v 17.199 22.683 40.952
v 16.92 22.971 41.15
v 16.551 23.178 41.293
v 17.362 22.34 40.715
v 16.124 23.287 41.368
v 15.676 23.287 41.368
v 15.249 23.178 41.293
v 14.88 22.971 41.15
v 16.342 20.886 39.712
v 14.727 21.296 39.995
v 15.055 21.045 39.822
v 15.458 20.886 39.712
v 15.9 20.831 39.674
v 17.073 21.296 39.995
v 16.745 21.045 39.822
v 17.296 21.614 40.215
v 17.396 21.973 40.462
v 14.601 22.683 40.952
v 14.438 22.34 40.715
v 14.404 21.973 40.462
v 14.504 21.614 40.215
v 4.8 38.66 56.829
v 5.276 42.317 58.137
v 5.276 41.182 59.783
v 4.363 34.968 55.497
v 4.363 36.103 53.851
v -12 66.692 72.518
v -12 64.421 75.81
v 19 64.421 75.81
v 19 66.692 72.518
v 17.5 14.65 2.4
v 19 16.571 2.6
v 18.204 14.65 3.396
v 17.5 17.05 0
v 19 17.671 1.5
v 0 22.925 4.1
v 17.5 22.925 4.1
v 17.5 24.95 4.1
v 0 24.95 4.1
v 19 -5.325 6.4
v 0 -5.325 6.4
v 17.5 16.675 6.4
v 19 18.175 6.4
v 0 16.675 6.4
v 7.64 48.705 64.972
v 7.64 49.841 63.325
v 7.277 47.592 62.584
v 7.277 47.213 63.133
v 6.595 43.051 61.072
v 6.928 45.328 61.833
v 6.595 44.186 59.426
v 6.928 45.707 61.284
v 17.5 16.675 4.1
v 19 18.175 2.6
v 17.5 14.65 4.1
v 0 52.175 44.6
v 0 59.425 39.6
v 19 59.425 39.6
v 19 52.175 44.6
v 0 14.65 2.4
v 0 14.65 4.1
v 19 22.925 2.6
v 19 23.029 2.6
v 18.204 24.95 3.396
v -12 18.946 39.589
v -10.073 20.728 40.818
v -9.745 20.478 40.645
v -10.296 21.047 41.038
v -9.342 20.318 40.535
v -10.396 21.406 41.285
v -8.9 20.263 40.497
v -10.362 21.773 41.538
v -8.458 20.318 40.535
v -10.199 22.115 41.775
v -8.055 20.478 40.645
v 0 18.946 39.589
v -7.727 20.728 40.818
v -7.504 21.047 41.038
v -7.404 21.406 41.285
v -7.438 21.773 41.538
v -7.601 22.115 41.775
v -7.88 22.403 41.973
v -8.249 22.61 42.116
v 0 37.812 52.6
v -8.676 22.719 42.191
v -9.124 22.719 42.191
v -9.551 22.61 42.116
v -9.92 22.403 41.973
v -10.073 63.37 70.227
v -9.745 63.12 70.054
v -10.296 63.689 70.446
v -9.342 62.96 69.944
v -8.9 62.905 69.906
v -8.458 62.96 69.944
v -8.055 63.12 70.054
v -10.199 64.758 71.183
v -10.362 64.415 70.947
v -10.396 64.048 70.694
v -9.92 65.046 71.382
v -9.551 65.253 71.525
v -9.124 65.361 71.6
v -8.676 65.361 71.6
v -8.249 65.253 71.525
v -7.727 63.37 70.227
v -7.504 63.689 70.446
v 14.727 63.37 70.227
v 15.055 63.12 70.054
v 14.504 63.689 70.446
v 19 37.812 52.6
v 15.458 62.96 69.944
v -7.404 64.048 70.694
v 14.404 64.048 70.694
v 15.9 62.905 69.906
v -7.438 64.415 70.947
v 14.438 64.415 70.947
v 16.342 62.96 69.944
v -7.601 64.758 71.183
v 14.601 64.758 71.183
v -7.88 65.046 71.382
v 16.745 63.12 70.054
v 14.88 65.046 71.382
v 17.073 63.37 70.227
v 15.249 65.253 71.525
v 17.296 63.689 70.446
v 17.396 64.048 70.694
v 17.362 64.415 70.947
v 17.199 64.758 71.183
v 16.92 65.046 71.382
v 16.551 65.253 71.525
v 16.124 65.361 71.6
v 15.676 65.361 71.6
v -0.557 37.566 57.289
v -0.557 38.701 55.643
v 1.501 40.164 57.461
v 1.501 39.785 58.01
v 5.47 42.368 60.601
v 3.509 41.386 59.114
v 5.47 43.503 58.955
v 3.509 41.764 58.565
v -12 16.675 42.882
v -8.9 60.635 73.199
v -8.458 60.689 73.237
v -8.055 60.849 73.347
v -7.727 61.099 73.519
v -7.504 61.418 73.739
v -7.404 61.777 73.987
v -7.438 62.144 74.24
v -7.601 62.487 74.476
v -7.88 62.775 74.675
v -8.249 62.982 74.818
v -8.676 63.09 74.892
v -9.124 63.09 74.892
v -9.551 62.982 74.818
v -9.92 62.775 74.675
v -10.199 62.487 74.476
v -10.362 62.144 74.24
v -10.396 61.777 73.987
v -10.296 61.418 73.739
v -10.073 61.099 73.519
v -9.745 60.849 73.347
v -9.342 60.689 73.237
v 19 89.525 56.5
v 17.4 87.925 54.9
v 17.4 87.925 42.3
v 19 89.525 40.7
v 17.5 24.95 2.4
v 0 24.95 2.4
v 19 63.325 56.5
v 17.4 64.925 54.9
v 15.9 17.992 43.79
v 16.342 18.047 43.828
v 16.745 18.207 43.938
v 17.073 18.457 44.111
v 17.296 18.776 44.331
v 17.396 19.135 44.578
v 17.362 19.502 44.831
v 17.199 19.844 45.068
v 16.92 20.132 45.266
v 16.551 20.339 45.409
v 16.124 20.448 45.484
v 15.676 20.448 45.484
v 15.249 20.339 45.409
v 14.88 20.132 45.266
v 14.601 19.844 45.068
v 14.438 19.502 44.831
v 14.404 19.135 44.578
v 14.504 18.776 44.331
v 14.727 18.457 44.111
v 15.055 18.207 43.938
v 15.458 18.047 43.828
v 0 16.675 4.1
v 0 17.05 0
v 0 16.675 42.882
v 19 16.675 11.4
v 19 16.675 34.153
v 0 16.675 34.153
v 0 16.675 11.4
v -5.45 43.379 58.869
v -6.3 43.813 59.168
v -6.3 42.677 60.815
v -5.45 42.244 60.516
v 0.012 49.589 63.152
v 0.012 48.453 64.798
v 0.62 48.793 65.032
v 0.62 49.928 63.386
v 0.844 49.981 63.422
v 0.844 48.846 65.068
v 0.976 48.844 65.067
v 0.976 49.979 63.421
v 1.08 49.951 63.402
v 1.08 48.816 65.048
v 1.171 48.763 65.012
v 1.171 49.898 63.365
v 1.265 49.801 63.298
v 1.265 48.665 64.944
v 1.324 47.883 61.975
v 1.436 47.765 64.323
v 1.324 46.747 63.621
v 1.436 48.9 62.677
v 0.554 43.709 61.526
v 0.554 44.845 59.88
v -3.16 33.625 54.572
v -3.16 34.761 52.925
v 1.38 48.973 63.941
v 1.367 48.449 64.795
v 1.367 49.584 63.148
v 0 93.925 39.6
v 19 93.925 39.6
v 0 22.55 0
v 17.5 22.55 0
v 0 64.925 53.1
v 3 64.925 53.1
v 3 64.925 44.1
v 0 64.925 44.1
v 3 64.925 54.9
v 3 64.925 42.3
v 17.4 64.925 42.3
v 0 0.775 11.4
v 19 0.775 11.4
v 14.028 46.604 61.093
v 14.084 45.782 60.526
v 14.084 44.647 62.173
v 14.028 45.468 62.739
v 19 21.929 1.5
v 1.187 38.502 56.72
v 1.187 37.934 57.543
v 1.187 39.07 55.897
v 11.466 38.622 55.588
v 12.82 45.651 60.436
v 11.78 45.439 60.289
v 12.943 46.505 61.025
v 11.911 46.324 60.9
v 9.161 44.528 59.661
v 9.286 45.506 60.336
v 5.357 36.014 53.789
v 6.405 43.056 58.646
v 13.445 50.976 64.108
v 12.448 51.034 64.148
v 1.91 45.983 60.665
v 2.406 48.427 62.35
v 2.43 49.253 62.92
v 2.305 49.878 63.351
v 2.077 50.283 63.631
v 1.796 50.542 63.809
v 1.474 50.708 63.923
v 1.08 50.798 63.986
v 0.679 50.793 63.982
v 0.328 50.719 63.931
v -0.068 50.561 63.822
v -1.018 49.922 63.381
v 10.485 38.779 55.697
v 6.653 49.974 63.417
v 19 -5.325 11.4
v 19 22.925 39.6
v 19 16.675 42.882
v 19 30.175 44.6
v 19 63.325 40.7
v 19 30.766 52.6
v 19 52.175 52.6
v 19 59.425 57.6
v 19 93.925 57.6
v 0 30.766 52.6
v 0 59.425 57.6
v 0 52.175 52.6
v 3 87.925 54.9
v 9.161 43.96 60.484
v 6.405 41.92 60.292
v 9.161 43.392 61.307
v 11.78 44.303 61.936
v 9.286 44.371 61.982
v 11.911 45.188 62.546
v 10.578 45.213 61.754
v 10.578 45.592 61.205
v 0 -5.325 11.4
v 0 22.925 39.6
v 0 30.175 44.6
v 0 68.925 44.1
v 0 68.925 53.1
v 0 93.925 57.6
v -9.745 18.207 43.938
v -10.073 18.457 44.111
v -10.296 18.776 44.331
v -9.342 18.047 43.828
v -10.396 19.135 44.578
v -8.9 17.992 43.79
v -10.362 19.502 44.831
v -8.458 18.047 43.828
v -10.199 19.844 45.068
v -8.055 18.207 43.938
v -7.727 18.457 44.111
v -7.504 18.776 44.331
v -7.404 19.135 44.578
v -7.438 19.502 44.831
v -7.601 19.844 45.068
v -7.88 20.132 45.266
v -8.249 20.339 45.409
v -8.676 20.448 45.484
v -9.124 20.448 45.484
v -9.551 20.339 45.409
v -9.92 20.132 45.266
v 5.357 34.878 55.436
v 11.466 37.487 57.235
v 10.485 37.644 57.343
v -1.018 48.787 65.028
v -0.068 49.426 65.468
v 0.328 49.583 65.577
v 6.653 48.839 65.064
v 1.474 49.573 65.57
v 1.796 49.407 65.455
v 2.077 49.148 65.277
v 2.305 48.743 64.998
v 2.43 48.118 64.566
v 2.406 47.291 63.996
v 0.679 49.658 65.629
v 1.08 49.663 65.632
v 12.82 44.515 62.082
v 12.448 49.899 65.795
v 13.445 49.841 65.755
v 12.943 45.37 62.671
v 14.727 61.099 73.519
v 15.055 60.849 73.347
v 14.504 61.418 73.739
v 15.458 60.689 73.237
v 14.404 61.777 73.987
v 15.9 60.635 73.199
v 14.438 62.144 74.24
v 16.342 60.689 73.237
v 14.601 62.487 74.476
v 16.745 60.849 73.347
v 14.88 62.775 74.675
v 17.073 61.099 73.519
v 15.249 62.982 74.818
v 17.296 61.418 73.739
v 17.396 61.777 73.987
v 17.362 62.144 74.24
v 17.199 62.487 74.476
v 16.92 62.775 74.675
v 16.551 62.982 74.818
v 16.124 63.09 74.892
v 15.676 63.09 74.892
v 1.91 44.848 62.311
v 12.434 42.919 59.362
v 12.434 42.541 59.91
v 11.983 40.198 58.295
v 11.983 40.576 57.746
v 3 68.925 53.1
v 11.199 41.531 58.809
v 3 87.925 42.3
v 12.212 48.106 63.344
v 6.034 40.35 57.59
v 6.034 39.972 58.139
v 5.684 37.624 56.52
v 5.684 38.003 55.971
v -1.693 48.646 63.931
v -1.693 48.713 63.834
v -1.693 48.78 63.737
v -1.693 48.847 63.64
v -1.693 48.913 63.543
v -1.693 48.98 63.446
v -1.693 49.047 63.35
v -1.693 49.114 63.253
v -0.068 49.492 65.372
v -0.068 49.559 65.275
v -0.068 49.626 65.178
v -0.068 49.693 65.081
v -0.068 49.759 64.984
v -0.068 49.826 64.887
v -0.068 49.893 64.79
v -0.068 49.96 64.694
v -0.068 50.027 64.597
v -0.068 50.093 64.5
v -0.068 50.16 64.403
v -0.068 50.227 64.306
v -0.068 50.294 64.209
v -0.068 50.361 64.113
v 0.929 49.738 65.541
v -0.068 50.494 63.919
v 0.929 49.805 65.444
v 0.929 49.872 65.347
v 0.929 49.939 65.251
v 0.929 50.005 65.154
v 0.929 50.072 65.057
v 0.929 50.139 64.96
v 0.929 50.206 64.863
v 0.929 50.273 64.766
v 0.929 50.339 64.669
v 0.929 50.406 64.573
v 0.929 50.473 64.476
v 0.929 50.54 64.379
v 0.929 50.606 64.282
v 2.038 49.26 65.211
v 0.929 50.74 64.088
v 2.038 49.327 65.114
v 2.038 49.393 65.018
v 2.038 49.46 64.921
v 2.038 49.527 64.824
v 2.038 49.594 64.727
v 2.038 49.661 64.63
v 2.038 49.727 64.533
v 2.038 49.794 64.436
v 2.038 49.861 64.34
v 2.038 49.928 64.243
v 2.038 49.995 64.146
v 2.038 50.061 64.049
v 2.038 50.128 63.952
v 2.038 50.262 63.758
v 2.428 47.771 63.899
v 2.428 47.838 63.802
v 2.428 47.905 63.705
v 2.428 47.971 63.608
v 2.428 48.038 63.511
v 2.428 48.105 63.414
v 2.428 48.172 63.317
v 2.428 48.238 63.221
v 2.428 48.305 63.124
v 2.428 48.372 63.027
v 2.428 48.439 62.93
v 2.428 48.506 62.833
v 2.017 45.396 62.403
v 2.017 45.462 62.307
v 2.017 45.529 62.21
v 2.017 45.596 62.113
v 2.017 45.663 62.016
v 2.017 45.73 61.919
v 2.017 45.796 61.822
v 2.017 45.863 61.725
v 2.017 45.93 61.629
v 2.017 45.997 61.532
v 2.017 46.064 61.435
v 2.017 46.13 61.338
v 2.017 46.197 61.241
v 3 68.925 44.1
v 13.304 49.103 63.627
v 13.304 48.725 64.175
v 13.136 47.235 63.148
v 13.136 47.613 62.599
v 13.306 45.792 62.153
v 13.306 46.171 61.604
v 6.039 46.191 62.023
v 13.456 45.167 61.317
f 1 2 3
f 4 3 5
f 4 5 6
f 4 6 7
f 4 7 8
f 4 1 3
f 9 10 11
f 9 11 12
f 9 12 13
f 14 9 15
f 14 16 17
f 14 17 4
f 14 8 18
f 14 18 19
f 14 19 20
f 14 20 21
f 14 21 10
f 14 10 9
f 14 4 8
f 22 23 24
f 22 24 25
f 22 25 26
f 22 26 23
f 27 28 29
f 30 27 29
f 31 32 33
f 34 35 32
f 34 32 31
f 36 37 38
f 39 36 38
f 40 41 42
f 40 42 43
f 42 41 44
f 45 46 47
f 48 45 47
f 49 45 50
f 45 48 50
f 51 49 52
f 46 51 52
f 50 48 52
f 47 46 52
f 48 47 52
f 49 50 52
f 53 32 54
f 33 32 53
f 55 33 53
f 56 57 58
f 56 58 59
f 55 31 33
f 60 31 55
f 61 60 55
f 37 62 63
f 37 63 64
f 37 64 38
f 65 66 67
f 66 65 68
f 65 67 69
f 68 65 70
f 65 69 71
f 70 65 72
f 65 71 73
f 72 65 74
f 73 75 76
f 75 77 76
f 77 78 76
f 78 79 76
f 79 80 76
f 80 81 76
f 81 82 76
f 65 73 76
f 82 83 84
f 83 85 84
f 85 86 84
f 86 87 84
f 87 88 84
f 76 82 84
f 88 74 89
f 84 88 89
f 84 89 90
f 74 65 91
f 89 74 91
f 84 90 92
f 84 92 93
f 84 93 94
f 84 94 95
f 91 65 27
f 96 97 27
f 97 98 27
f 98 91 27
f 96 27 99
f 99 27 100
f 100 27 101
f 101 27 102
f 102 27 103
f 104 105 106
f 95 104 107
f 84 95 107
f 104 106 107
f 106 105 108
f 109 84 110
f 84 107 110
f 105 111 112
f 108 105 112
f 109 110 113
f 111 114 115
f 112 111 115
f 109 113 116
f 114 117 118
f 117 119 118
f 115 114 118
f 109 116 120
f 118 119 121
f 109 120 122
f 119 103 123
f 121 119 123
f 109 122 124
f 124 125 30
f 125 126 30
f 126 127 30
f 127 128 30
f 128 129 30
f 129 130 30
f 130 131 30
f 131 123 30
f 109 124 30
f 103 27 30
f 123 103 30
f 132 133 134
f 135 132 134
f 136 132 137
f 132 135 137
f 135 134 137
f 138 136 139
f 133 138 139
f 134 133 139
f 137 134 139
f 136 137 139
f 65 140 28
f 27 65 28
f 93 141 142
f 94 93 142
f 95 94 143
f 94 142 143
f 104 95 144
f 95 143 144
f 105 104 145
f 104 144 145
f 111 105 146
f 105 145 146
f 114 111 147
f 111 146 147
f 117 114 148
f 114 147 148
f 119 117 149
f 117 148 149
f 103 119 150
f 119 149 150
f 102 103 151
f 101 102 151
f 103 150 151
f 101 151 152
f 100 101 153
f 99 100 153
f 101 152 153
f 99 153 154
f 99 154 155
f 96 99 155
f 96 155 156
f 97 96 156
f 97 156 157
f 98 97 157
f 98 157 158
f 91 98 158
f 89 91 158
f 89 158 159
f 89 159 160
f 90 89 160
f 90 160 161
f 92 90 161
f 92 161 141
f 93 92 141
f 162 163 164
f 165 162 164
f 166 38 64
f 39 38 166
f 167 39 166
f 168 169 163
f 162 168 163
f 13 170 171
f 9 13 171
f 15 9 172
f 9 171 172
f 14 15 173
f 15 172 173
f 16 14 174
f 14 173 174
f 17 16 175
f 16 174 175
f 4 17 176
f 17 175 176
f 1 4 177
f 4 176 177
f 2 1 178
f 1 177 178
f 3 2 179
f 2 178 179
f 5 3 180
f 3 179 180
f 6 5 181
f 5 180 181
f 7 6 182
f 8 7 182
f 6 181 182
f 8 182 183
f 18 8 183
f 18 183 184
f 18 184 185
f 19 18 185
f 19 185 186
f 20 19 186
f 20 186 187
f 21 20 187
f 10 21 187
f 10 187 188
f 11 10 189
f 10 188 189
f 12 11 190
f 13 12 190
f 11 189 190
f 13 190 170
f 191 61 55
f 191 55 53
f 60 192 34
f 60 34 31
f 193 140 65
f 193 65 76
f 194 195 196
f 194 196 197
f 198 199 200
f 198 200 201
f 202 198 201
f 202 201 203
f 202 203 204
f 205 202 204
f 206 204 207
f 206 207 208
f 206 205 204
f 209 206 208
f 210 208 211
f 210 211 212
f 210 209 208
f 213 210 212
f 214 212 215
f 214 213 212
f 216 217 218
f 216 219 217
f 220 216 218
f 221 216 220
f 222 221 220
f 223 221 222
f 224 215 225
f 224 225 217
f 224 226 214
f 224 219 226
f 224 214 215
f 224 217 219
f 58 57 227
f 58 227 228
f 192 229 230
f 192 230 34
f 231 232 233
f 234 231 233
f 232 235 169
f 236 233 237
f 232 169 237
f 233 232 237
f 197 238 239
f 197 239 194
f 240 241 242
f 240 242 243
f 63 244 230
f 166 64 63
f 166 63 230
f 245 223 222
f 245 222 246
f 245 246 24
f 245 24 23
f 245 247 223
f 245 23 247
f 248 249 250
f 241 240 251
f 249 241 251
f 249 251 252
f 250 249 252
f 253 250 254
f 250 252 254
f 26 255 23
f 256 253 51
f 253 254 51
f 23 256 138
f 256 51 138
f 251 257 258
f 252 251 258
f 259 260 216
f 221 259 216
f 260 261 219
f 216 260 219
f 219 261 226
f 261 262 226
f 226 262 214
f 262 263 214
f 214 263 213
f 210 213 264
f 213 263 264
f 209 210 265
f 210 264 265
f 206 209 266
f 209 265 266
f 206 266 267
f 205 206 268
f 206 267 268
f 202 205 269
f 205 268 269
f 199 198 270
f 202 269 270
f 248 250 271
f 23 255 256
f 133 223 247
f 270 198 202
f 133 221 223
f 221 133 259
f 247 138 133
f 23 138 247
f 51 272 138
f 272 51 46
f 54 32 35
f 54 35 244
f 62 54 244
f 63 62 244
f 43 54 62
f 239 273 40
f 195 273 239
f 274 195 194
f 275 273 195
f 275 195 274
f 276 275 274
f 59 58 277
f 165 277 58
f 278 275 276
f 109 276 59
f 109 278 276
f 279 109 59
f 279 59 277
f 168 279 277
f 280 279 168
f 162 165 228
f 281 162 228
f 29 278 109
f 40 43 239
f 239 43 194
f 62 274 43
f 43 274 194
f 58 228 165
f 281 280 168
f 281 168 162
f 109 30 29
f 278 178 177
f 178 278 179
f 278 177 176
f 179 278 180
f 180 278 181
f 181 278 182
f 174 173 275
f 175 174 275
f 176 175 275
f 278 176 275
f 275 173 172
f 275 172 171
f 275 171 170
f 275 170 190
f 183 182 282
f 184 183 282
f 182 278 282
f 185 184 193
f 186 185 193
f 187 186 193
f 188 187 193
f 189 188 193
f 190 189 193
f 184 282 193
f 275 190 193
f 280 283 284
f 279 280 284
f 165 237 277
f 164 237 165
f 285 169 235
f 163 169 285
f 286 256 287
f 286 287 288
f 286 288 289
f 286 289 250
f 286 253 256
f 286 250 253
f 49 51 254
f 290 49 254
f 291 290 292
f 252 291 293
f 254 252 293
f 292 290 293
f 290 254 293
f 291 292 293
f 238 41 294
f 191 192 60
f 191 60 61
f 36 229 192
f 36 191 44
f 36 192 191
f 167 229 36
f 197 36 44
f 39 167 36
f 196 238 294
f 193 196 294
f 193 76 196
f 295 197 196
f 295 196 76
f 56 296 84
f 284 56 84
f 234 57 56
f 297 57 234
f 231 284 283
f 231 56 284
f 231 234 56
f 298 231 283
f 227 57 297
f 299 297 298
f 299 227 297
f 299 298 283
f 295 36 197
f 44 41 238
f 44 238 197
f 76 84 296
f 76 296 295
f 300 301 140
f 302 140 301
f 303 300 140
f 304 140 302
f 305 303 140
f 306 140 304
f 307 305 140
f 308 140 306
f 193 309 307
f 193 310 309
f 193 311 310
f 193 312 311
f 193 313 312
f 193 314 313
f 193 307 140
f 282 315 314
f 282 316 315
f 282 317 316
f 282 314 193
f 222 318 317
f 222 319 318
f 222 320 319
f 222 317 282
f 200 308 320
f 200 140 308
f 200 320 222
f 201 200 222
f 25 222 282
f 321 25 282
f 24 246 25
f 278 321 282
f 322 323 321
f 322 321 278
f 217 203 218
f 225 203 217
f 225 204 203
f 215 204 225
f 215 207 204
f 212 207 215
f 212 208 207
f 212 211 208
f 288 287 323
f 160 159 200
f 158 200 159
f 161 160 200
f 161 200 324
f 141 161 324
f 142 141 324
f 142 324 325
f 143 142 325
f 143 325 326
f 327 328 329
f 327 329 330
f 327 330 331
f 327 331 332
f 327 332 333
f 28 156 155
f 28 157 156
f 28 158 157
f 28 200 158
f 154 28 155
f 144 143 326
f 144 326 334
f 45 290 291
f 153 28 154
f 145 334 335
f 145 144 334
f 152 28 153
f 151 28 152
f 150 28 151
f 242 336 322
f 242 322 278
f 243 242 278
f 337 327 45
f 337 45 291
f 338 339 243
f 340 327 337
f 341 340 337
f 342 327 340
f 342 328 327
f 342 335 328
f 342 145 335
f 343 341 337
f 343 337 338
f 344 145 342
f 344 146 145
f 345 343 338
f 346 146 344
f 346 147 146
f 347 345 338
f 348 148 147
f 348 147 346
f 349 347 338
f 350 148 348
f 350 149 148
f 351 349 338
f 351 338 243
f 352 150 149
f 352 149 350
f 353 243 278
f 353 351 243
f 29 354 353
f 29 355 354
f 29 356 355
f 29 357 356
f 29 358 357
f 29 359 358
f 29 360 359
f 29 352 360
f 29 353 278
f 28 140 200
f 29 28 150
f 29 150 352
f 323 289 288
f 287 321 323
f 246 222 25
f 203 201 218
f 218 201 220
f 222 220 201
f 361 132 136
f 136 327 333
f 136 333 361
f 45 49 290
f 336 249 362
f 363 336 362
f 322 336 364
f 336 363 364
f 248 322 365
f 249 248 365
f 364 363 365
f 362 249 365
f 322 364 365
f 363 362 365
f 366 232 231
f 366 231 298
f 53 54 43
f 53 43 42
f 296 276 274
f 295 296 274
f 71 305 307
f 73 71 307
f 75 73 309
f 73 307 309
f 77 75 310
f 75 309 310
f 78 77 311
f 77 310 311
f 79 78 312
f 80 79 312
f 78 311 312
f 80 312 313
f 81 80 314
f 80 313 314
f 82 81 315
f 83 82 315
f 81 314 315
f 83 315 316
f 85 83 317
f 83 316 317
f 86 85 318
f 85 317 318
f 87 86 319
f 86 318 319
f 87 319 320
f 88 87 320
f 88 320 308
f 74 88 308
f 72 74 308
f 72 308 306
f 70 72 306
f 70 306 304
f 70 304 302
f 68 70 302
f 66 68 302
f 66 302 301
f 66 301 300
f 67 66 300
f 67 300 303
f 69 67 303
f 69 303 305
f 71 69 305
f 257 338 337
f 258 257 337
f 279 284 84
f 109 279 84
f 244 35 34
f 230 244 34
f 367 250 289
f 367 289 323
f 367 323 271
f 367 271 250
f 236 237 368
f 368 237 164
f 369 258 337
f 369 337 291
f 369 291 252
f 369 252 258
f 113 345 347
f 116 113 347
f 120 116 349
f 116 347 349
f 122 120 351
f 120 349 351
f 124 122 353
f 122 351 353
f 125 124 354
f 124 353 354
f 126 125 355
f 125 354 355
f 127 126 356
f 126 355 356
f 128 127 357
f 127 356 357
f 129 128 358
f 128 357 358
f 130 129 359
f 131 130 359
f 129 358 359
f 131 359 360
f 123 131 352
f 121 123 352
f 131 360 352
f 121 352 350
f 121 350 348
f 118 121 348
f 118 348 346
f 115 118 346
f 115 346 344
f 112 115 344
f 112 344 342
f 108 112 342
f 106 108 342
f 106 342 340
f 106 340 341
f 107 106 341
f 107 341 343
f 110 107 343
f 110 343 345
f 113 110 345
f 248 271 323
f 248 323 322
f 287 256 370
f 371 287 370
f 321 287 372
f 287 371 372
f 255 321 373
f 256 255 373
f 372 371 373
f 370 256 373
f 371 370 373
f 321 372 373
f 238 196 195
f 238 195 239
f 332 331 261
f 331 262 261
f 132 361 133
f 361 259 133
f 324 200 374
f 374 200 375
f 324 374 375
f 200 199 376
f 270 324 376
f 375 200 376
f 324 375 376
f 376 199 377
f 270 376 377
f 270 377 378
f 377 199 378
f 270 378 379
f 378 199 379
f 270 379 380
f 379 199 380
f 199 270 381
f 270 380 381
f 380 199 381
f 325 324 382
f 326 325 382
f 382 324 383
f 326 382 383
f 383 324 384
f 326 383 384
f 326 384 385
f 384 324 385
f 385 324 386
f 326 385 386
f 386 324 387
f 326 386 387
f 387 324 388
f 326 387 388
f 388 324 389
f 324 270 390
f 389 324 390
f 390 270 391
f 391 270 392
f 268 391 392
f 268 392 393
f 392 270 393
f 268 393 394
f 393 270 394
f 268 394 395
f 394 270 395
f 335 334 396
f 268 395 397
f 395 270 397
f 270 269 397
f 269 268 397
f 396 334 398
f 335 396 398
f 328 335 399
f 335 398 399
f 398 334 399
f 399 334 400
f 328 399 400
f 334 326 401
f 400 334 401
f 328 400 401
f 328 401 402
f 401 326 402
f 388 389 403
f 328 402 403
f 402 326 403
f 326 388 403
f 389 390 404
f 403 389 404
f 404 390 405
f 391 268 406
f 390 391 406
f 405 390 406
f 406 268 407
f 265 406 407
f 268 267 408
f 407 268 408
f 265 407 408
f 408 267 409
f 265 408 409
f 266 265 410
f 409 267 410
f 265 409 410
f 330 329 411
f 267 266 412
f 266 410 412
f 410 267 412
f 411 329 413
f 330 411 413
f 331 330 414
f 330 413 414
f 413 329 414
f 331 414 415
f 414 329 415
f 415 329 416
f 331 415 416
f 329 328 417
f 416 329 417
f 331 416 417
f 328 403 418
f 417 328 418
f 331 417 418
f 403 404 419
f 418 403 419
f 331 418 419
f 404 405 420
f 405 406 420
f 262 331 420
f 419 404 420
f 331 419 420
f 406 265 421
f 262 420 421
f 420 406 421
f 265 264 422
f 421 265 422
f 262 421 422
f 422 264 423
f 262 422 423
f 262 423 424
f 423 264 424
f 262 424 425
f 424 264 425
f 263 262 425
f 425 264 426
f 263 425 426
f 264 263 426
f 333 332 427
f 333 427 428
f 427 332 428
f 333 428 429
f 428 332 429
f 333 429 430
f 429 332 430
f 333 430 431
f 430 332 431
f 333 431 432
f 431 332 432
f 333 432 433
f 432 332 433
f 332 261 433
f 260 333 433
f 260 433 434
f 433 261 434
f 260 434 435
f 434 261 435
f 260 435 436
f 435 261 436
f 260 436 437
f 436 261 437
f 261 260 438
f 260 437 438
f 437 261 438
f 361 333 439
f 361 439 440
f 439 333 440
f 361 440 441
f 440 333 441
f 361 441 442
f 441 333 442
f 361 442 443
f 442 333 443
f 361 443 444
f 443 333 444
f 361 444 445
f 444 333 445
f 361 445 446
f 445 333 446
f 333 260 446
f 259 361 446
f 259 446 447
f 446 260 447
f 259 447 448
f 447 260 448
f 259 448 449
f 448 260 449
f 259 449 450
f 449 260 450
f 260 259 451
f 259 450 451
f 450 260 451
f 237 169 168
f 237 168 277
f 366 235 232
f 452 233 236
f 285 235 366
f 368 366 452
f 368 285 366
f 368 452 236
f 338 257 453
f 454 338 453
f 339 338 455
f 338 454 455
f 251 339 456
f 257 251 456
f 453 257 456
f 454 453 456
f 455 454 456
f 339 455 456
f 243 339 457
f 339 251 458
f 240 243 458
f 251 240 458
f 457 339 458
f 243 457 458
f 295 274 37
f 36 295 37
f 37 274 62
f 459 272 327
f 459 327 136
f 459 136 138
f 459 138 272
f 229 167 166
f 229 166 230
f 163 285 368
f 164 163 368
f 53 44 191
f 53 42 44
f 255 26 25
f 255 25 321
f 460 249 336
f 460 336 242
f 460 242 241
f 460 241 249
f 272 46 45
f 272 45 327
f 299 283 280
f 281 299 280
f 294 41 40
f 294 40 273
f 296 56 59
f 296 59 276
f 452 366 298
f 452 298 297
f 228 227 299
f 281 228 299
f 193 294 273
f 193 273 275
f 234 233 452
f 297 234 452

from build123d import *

# Parameters (mm, degrees)
BOSS_EXTRUDE1_DEPTH     = 19
SKETCH3_W               = 5.025645198
SKETCH3_H               = 33.799871634
BOSS_EXTRUDE2_DEPTH     = 19
SKETCH4_W               = 5.025645198
SKETCH4_H               = 7.749871634
CUT_EXTRUDE1_DEPTH      = 41.8379487
SKETCH5_W               = 11.025645198
SKETCH5_H               = 26.05
CUT_EXTRUDE3_DEPTH      = 37.732721166
SKETCH6_W               = 40.5
SKETCH6_H               = 6.25
BOSS_EXTRUDE3_DEPTH     = 19
SKETCH7_W               = 18
SKETCH7_H               = 64
BOSS_EXTRUDE4_DEPTH     = 19
BOSS_EXTRUDE5_DEPTH     = 19
SKETCH10_W              = 12.6
SKETCH10_H              = 23
CUT_EXTRUDE4_DEPTH      = 16
BOSS_EXTRUDE7_DEPTH     = 19
CUT_EXTRUDE6_DEPTH      = 106.993941454
CUT_EXTRUDE7_DEPTH      = 106.993941454
SKETCH20_W              = 9.1
SKETCH20_H              = 10.3
CUT_EXTRUDE10_DEPTH     = 106.993941454
SKETCH21_W              = 5
SKETCH21_H              = 22
BOSS_EXTRUDE8_DEPTH     = 19
SKETCH23_W              = 19
SKETCH23_H              = 18
BOSS_EXTRUDE9_DEPTH     = 2
CHAMFER1_SIZE           = 1.5
SKETCH24_W              = 9
SKETCH24_H              = 4
CUT_EXTRUDE12_DEPTH     = 108.151367817
CUT_EXTRUDE13_DEPTH     = 108.640213791
BOSS_EXTRUDE10_DEPTH    = 19
SKETCH29_W              = 19
SKETCH29_H              = 18
BOSS_EXTRUDE11_DEPTH    = 10
SKETCH30_W              = 12.6
SKETCH30_H              = 23
BOSS_EXTRUDE12_DEPTH    = 19
SKETCH34_W              = 18
SKETCH34_H              = 5
CUT_EXTRUDE16_DEPTH     = 117.038423055
SKETCH36_W              = 31
SKETCH36_H              = 58
BOSS_EXTRUDE13_DEPTH    = 4
SKETCH37_R              = 1.5
CUT_EXTRUDE17_DEPTH     = 5
CUT_EXTRUDE_THIN1_START = -2
CUT_EXTRUDE_THIN1_DEPTH = 2
SKETCH40_W              = 12.6
SKETCH40_H              = 23
CUT_EXTRUDE18_DEPTH     = 16
SKETCH41_W              = 9
SKETCH41_H              = 4
CUT_EXTRUDE19_DEPTH     = 16
CHAMFER2_SIZE           = 1.6


# Read off the part's stored shape, not the designer's step: Cut-Extrude-Thin1
with BuildPart() as part:
    # Sketch2 → Boss-Extrude1 (new body)
    with BuildSketch(Plane(origin=(0, 0, 0), x_dir=(0, 0, -1), z_dir=(1, 0, 0))):
        Polygon((-4.1, 3.125), (-14.1, 3.125), (-14.1, -3.125), (-4.1, -3.125), (-4.1, -5.15), (-2.4, -5.15), (0, -2.75), (0, 2.75), (-2.4, 5.15), (-4.1, 5.15), align=None)
    boss_extrude1 = extrude(amount=BOSS_EXTRUDE1_DEPTH)

    # Sketch3 → Boss-Extrude2 (add)
    with BuildSketch(Plane.ZY):
        with Locations((16.612822599, 13.774935817)):
            Rectangle(SKETCH3_W, SKETCH3_H)
    extrude(amount=-BOSS_EXTRUDE2_DEPTH)

    # Mirror2: Boss-Extrude1 across plane
    add(boss_extrude1.mirror(Plane.ZX.offset(9.9)))

    # Sketch4 → Cut-Extrude1 (cut, through all)
    with BuildSketch(Plane.ZY):
        with Locations((16.612822599, 26.799935817)):
            Rectangle(SKETCH4_W, SKETCH4_H)
    extrude(amount=-CUT_EXTRUDE1_DEPTH, mode=Mode.SUBTRACT)

    # Sketch5 → Cut-Extrude3 (cut, through all)
    with BuildSketch(Plane(origin=(19, 0, 0), x_dir=(0, 0, -1), z_dir=(1, 0, 0))):
        with Locations((-13.612822599, 9.9)):
            Rectangle(SKETCH5_W, SKETCH5_H)
    extrude(amount=-CUT_EXTRUDE3_DEPTH, mode=Mode.SUBTRACT)


with BuildPart() as cut_extrude3_piece_1:
    # of the separate pieces the step leaves, piece 1, a body of its own (cut_extrude3_pieces)
    add(part.part.solids().sort_by_distance((0, 16.675, 8.1))[0])



with BuildPart() as cut_extrude3_piece_2:
    # of the separate pieces the step leaves, piece 2, a body of its own (cut_extrude3_pieces)
    add(part.part.solids().sort_by_distance((0, 3.125, 4.1))[0])


with BuildPart() as cut_extrude3_piece_1_1:
    add(cut_extrude3_piece_1.part)

    add(cut_extrude3_piece_2.part)  # Boss-Extrude3 merges Cut-Extrude3 piece 2
    # Sketch6 → Boss-Extrude3 (add)
    with BuildSketch(Plane(origin=(19, 0, 0), x_dir=(0, 0, -1), z_dir=(1, 0, 0))):
        Polygon((-35.815909091, 16.675), (-48.6, 16.675), (-8.1, -3.125), (-8.1, 3.125), align=None)
        with Locations((-28.35, 19.8)):
            Rectangle(SKETCH6_W, SKETCH6_H)
    extrude(amount=-BOSS_EXTRUDE3_DEPTH)

    # Sketch7 → Boss-Extrude4 (add)
    with BuildSketch(Plane.ZY):
        with Locations((48.6, 54.925)):
            Rectangle(SKETCH7_W, SKETCH7_H)
    extrude(amount=-BOSS_EXTRUDE4_DEPTH)

    # Sketch9 → Boss-Extrude5 (add)
    with BuildSketch(Plane.ZY):
        Polygon((57.6, 22.925), (48.6, 22.925), (48.6, 16.675), align=None)
    extrude(amount=-BOSS_EXTRUDE5_DEPTH)

    # Sketch10 → Cut-Extrude4 (cut)
    with BuildSketch(Plane.ZY):
        with Locations((48.6, 74.425)):
            Rectangle(SKETCH10_W, SKETCH10_H)
    extrude(amount=-CUT_EXTRUDE4_DEPTH, mode=Mode.SUBTRACT)

    # Sketch13 → Boss-Extrude7 (add)
    with BuildSketch(Plane.ZY):
        Polygon((9.1, 16.675), (9.1, 3.613888889), (35.815909091, 16.675), align=None)
    extrude(amount=-BOSS_EXTRUDE7_DEPTH)

    # Sketch14 → Cut-Extrude6 (cut, through all)
    with BuildSketch(Plane.ZY):
        Polygon((39.6, 59.425), (44.6, 52.175), (44.6, 30.175), (39.6, 22.925), align=None)
        Polygon((52.6, 30.175), (57.6, 22.925), (57.6, 59.425), (52.6, 52.175), align=None)
    extrude(amount=-CUT_EXTRUDE6_DEPTH, mode=Mode.SUBTRACT)

    # Sketch16 → Cut-Extrude7 (cut, through all)
    with BuildSketch(Plane(origin=(19, 0, 0), x_dir=(0, 0, -1), z_dir=(1, 0, 0))):
        Polygon((-8.1, -3.125), (-58.554154728, 21.541475645), (-57.6, 22.925), align=None)
    extrude(amount=-CUT_EXTRUDE7_DEPTH, mode=Mode.SUBTRACT)

    # Sketch20 → Cut-Extrude10 (cut, through all)
    with BuildSketch(Plane.ZY):
        Polygon((52.6, 16.675), (9.1, 16.675), (9.1, 5.15), (9.1, -5.15), (52.6, -5.15), align=None)
        with Locations((4.55, 0)):
            Rectangle(SKETCH20_W, SKETCH20_H)
    extrude(amount=-CUT_EXTRUDE10_DEPTH, mode=Mode.SUBTRACT)

    # Sketch21 → Boss-Extrude8 (add, through all)
    with BuildSketch(Plane.ZY):
        with Locations((8.9, 5.675)):
            Rectangle(SKETCH21_W, SKETCH21_H)
    extrude(amount=-BOSS_EXTRUDE8_DEPTH)

    # Sketch23 → Boss-Extrude9 (add)
    with BuildSketch(Plane(origin=(0, 86.925, 0), x_dir=(1, 0, 0), z_dir=(0, 1, 0))):
        with Locations((9.5, -48.6)):
            Rectangle(SKETCH23_W, SKETCH23_H)
    extrude(amount=BOSS_EXTRUDE9_DEPTH)

    # Chamfer1
    # the kernel refuses this chamfer: 1.5 mm, written as the material it takes off along each edge
    with BuildSketch(Plane(origin=(19, 10.792475518, 4.1), x_dir=(0.027495876610586775, 0, -0.9996219169112968), z_dir=(0, 1, 0)), Plane(origin=(19, 22.925, 4.1), x_dir=(0.027495876610586775, 0, -0.9996219169112968), z_dir=(0, 1, 0))) as chamfer1_piece_1:
        Polygon((CHAMFER1_SIZE * 0.999621916911, CHAMFER1_SIZE * 0.0274958766106), (-CHAMFER1_SIZE * 0.0274958766106, CHAMFER1_SIZE * 0.999621916911), (0, 0), align=None)
    extrude(amount=5.882524482, mode=Mode.SUBTRACT)
    with BuildSketch(Plane(origin=(19, 19.77768172, -2.72768172), x_dir=(0.027495876610586747, 0.7068394360706739, 0.7068394360706729), z_dir=(0, -0.707106781186547, 0.707106781186548)), Plane(origin=(19, 27.67768172, 5.12768172), x_dir=(0.027495876610586768, -0.7068394360706726, 0.7068394360706743), z_dir=(0, -0.7071067811865483, -0.7071067811865467))) as chamfer1_piece_2:
        Polygon((CHAMFER1_SIZE * 0.999621916911, CHAMFER1_SIZE * 0.0274958766106), (-CHAMFER1_SIZE * 0.0274958766106, CHAMFER1_SIZE * 0.999621916911), (0, 0), align=None)
    extrude(amount=11.109161514, mode=Mode.SUBTRACT)
    with BuildSketch(Plane(origin=(19, 26.407524482, 0), x_dir=(0.027495876610586778, 1.269416837651831e-15, 0.9996219169112968), z_dir=(0, -1, 0))) as chamfer1_piece_3:
        Polygon((CHAMFER1_SIZE * 0.999621916911, CHAMFER1_SIZE * 0.0274958766106), (-CHAMFER1_SIZE * 0.0274958766106, CHAMFER1_SIZE * 0.999621916911), (0, 0), align=None)
    extrude(amount=13.215048964, mode=Mode.SUBTRACT)
    with BuildSketch(Plane(origin=(19, 16.675, 4.1), x_dir=(0.027495876610586768, 0.9996219169112968, 0), z_dir=(0, 0, 1))) as chamfer1_piece_4:
        Polygon((CHAMFER1_SIZE * 0.999621916911, CHAMFER1_SIZE * 0.0274958766106), (-CHAMFER1_SIZE * 0.0274958766106, CHAMFER1_SIZE * 0.999621916911), (0, 0), align=None)
    extrude(amount=2.3, mode=Mode.SUBTRACT)
    with BuildSketch(Plane(origin=(19, 16.675, 0.242475518), x_dir=(0.027495876610586768, 0.9996219169112968, 0), z_dir=(0, 0, 1))) as chamfer1_piece_5a_section:
        Polygon((CHAMFER1_SIZE * 0.999621916911, CHAMFER1_SIZE * 0.0274958766106), (-CHAMFER1_SIZE * 0.0274958766106, CHAMFER1_SIZE * 0.999621916911), (0, 0), align=None)
    chamfer1_piece_5a = extrude(amount=6.157524482, mode=Mode.PRIVATE)
    chamfer1_piece_5a = split(chamfer1_piece_5a, bisect_by=Plane(origin=(18.50530956, 17.16969044, 4.1), z_dir=(0, 0, -1)), keep=Keep.TOP, mode=Mode.PRIVATE)
    with BuildSketch(Plane(origin=(19, 10.792475518, 4.1), x_dir=(0.027495876610586775, 0, -0.9996219169112968), z_dir=(0, 1, 0))) as chamfer1_piece_5b_section:
        Polygon((CHAMFER1_SIZE * 0.999621916911, CHAMFER1_SIZE * 0.0274958766106), (-CHAMFER1_SIZE * 0.0274958766106, CHAMFER1_SIZE * 0.999621916911), (0, 0), align=None)
    chamfer1_piece_5b = extrude(amount=9.740048964, mode=Mode.PRIVATE)
    chamfer1_piece_5b = split(chamfer1_piece_5b, bisect_by=Plane(origin=(18.50530956, 16.675, 3.60530956), z_dir=(0, 1, 0)), keep=Keep.TOP, mode=Mode.PRIVATE)
    chamfer1_piece_5 = chamfer1_piece_5a & chamfer1_piece_5b
    add(chamfer1_piece_5, mode=Mode.SUBTRACT)

    # Sketch24 → Cut-Extrude12 (cut, through all)
    with BuildSketch(Plane.ZY.offset(-16)):
        with Locations((48.6, 64.925)):
            Rectangle(SKETCH24_W, SKETCH24_H)
    extrude(amount=-CUT_EXTRUDE12_DEPTH, mode=Mode.SUBTRACT)

    # Sketch25 → Cut-Extrude13 (cut, through all)
    with BuildSketch(Plane.ZY):
        Polygon((52.6, 30.766303154), (42.881859894, 16.675), (45.723800384, 16.675), (57.6, 22.925), align=None)
    extrude(amount=-CUT_EXTRUDE13_DEPTH, mode=Mode.SUBTRACT)

    # Sketch28 → Boss-Extrude10 (add, through all)
    with BuildSketch(Plane.ZY):
        Polygon((11.4, -5.325), (42.881859894, 16.675), (34.152967104, 16.675), (11.4, 0.774882346), align=None)
    extrude(amount=-BOSS_EXTRUDE10_DEPTH)

    # Sketch29 → Boss-Extrude11 (add)
    with BuildSketch(Plane(origin=(0, 88.925, 0), x_dir=(1, 0, 0), z_dir=(0, 1, 0))):
        with Locations((9.5, -48.6)):
            Rectangle(SKETCH29_W, SKETCH29_H)
    extrude(amount=BOSS_EXTRUDE11_DEPTH)

    # Sketch30 → Boss-Extrude12 (add, through all)
    with BuildSketch(Plane.ZY):
        with Locations((48.6, 74.425)):
            Rectangle(SKETCH30_W, SKETCH30_H)
    extrude(amount=-BOSS_EXTRUDE12_DEPTH)

    # Sketch34 → Cut-Extrude16 (cut, through all)
    with BuildSketch(Plane.ZY):
        with Locations((48.6, 96.425)):
            Rectangle(SKETCH34_W, SKETCH34_H)
    extrude(amount=-CUT_EXTRUDE16_DEPTH, mode=Mode.SUBTRACT)

    # Sketch36 → Boss-Extrude13 (add)
    with BuildSketch(Plane(origin=(0, -14.666783834, 21.26683656), x_dir=(1, 0, 0), z_dir=(0, -0.5677329558036595, 0.8232127859153066))):
        with Locations((3.5, 67.072518273)):
            Rectangle(SKETCH36_W, SKETCH36_H)
    extrude(amount=-BOSS_EXTRUDE13_DEPTH)

    # Sketch37 → Cut-Extrude17 (cut)
    with BuildSketch(Plane(origin=(0, -14.666783834, 21.26683656), x_dir=(1, 0, 0), z_dir=(0, -0.5677329558036595, 0.8232127859153066))):
        with Locations(Location((-8.9, 92.972518273, 0), (0, 0, 270))):
            Circle(SKETCH37_R)
        with Locations(Location((15.9, 92.972518273, 0), (0, 0, 270))):
            Circle(SKETCH37_R)
        with Locations(Location((15.9, 41.172518273, 0), (0, 0, 270))):
            Circle(SKETCH37_R)
        with Locations(Location((-8.9, 41.172518273, 0), (0, 0, 270))):
            Circle(SKETCH37_R)
    extrude(amount=-CUT_EXTRUDE17_DEPTH, mode=Mode.SUBTRACT)

    # Cut-Extrude-Thin1 outline → Cut-Extrude-Thin1 (cut)
    with BuildSketch(Plane(origin=(0, -14.666783834, 21.26683656), x_dir=(1, 0, 0), z_dir=(0, -0.5677329558036595, 0.8232127859153066)).offset(CUT_EXTRUDE_THIN1_START)):
        with BuildLine():
            add(Edge.make_bspline(
                [(12.819722606, 71.891721205), (12.467350987, 69.027146263), (12.016257218, 66.18097235), (11.466444984, 63.353366575)],
                knots=[0.428290114, 0.428290114, 0.428290114, 0.428290114, 1, 1, 1, 1], degree=3))
            add(Edge.make_bspline(
                [(12.819722606, 71.891721205), (13.460807572, 72.01637124), (14.083838289, 72.050984058)],
                knots=[0.915367491, 0.915367491, 0.915367491, 1, 1, 1], degree=2))
            Line((14.083838289, 72.050984058), (14.028368269, 73.049444411))
            add(Edge.make_bspline(
                [(12.942983362, 72.929627931), (13.306922211, 72.989375516), (13.668784523, 73.029467536), (14.028368269, 73.049444411)],
                knots=[0.920420451, 0.920420451, 0.920420451, 0.920420451, 1, 1, 1, 1], degree=3))
            add(Edge.make_bspline(
                [(13.445435614, 78.360524964), (13.316943497, 76.542993923), (13.149459109, 74.732681085), (12.942983362, 72.929627931)],
                knots=[0, 0, 0, 0, 0.359295345, 0.359295345, 0.359295345, 0.359295345], degree=3))
            Line((13.445435614, 78.360524964), (12.447925246, 78.431044926))
            add(Edge.make_bspline(
                [(12.447925246, 78.431044926), (12.244802092, 75.557852039), (11.910758079, 72.709266295)],
                knots=[0, 0, 0, 0.38167443, 0.38167443, 0.38167443], degree=2))
            add(Edge.make_bspline(
                [(6.595184696, 70.112410703), (6.735581828, 70.2103088), (6.875653575, 70.305848913), (8.224138751, 71.204963789), (9.409914051, 71.834320858), (11.02491464, 72.450195671), (11.469196886, 72.593594477), (11.910758079, 72.709266295)],
                knots=[0.471095163, 0.471095163, 0.471095163, 0.471095163, 0.5, 0.5, 0.75, 0.75, 0.845573754, 0.845573754, 0.845573754, 0.845573754], degree=3))
            add(Edge.make_bspline(
                [(7.640101966, 76.981602559), (7.268933108, 74.717474641), (6.920624171, 72.427743664), (6.595184696, 70.112410703)],
                knots=[0, 0, 0, 0, 0.415393042, 0.415393042, 0.415393042, 0.415393042], degree=3))
            Line((7.640101966, 76.981602559), (6.653274325, 77.143377733))
            add(Edge.make_bspline(
                [(6.653274325, 77.143377733), (6.017113414, 73.262799802), (5.470323811, 69.283113976)],
                knots=[0, 0, 0, 0.473039412, 0.473039412, 0.473039412], degree=2))
            add(Edge.make_bspline(
                [(-0.55681592, 63.449443524), (1.526985957, 65.831573697), (3.530543581, 67.776669297), (5.470323811, 69.283113976)],
                knots=[0, 0, 0, 0, 0.394380239, 0.394380239, 0.394380239, 0.394380239], degree=3))
            add(Edge.make_bspline(
                [(-6.300362652, 69.65911012), (-5.344610287, 71.20203735), (-4.485476111, 72.527612488), (-2.954275062, 74.750823328), (-2.283718611, 75.647577027), (-1.397510328, 76.688851989), (-1.122134049, 76.985487588), (-0.593101493, 77.486785412), (-0.342250447, 77.692545245), (0.069685616, 77.93818792), (0.213854003, 78.009961095), (0.539343655, 78.11985521), (0.723306406, 78.158644487), (1.032580959, 78.153116796), (1.140675524, 78.140089735), (1.356374269, 78.086021348), (1.463635616, 78.044813802), (1.662514421, 77.938006005), (1.753827868, 77.872701283), (1.912993747, 77.729780548), (1.980991621, 77.652434008), (2.153497129, 77.416663082), (2.227674469, 77.256288431), (2.33565774, 76.942663079), (2.369611431, 76.787611964), (2.440268317, 76.312070013), (2.446396742, 75.978580644), (2.409943474, 75.227364349), (2.365428576, 74.810920821), (2.227966042, 73.879618653), (2.134797262, 73.365159897), (1.782700397, 71.665990726), (1.451087095, 70.325221126), (0.593298433, 67.21168847), (0.067082369, 65.439473727), (-0.55681592, 63.449443524)],
                knots=[0, 0, 0, 0, 0.125, 0.125, 0.25, 0.25, 0.3125, 0.3125, 0.375, 0.375, 0.40625, 0.40625, 0.4375, 0.4375, 0.453125, 0.453125, 0.46875, 0.46875, 0.484375, 0.484375, 0.5, 0.5, 0.53125, 0.53125, 0.5625, 0.5625, 0.625, 0.625, 0.6875, 0.6875, 0.75, 0.75, 0.875, 0.875, 1, 1, 1, 1], degree=3))
            Line((-6.300362652, 69.65911012), (-5.450247201, 69.132513766))
            add(Edge.make_bspline(
                [(-5.450247201, 69.132513766), (7.064304277, 89.335489944), (-3.159968941, 58.662670291)],
                knots=[0, 0, 0, 1, 1, 1], degree=2))
            add(Edge.make_bspline(
                [(-3.159968941, 58.662670291), (1.316464976, 64.542039241), (5.275695334, 67.842094682)],
                knots=[0, 0, 0, 0.452979179, 0.452979179, 0.452979179], degree=2))
            add(Edge.make_bspline(
                [(5.275695334, 67.842094682), (4.780418289, 64.110952406), (4.362996065, 60.29347339)],
                knots=[0.558489513, 0.558489513, 0.558489513, 1, 1, 1], degree=2))
            Line((4.362996065, 60.29347339), (5.35707098, 60.184776273))
            add(Edge.make_bspline(
                [(6.405235456, 68.739030913), (6.022352037, 65.925099747), (5.672958242, 63.0736809), (5.35707098, 60.184776273)],
                knots=[0.497346777, 0.497346777, 0.497346777, 0.497346777, 1, 1, 1, 1], degree=3))
            add(Edge.make_bspline(
                [(6.405235456, 68.739030913), (9.229211771, 70.867966423), (11.779877238, 71.633890502)],
                knots=[0.518208561, 0.518208561, 0.518208561, 0.847496575, 0.847496575, 0.847496575], degree=2))
            add(Edge.make_bspline(
                [(11.779877238, 71.633890502), (11.266423928, 67.563864235), (10.484829594, 63.544236234)],
                knots=[0.453776633, 0.453776633, 0.453776633, 1, 1, 1], degree=2))
            Line((10.484829594, 63.544236234), (11.466444984, 63.353366575))
        make_face()
    extrude(amount=CUT_EXTRUDE_THIN1_DEPTH, mode=Mode.SUBTRACT)

    # Sketch40 → Cut-Extrude18 (cut)
    with BuildSketch(Plane(origin=(19, 0, 0), x_dir=(0, 0, -1), z_dir=(1, 0, 0))):
        with Locations((-48.6, 76.425)):
            Rectangle(SKETCH40_W, SKETCH40_H)
    extrude(amount=-CUT_EXTRUDE18_DEPTH, mode=Mode.SUBTRACT)

    # Sketch41 → Cut-Extrude19 (cut)
    with BuildSketch(Plane(origin=(3, 0, 0), x_dir=(0, 0, -1), z_dir=(1, 0, 0))):
        with Locations((-48.6, 66.925)):
            Rectangle(SKETCH41_W, SKETCH41_H)
    extrude(amount=-CUT_EXTRUDE19_DEPTH, mode=Mode.SUBTRACT)

    # Chamfer2
    chamfer2_edges = [cut_extrude3_piece_1_1.edges().sort_by_distance(p)[0] for p in [
        (19, 76.425, 54.9),
        (19, 64.925, 48.6),
        (19, 76.425, 42.3),
        (19, 87.925, 48.6),
    ]]
    chamfer(chamfer2_edges, length=CHAMFER2_SIZE)


solid = cut_extrude3_piece_1_1.part
